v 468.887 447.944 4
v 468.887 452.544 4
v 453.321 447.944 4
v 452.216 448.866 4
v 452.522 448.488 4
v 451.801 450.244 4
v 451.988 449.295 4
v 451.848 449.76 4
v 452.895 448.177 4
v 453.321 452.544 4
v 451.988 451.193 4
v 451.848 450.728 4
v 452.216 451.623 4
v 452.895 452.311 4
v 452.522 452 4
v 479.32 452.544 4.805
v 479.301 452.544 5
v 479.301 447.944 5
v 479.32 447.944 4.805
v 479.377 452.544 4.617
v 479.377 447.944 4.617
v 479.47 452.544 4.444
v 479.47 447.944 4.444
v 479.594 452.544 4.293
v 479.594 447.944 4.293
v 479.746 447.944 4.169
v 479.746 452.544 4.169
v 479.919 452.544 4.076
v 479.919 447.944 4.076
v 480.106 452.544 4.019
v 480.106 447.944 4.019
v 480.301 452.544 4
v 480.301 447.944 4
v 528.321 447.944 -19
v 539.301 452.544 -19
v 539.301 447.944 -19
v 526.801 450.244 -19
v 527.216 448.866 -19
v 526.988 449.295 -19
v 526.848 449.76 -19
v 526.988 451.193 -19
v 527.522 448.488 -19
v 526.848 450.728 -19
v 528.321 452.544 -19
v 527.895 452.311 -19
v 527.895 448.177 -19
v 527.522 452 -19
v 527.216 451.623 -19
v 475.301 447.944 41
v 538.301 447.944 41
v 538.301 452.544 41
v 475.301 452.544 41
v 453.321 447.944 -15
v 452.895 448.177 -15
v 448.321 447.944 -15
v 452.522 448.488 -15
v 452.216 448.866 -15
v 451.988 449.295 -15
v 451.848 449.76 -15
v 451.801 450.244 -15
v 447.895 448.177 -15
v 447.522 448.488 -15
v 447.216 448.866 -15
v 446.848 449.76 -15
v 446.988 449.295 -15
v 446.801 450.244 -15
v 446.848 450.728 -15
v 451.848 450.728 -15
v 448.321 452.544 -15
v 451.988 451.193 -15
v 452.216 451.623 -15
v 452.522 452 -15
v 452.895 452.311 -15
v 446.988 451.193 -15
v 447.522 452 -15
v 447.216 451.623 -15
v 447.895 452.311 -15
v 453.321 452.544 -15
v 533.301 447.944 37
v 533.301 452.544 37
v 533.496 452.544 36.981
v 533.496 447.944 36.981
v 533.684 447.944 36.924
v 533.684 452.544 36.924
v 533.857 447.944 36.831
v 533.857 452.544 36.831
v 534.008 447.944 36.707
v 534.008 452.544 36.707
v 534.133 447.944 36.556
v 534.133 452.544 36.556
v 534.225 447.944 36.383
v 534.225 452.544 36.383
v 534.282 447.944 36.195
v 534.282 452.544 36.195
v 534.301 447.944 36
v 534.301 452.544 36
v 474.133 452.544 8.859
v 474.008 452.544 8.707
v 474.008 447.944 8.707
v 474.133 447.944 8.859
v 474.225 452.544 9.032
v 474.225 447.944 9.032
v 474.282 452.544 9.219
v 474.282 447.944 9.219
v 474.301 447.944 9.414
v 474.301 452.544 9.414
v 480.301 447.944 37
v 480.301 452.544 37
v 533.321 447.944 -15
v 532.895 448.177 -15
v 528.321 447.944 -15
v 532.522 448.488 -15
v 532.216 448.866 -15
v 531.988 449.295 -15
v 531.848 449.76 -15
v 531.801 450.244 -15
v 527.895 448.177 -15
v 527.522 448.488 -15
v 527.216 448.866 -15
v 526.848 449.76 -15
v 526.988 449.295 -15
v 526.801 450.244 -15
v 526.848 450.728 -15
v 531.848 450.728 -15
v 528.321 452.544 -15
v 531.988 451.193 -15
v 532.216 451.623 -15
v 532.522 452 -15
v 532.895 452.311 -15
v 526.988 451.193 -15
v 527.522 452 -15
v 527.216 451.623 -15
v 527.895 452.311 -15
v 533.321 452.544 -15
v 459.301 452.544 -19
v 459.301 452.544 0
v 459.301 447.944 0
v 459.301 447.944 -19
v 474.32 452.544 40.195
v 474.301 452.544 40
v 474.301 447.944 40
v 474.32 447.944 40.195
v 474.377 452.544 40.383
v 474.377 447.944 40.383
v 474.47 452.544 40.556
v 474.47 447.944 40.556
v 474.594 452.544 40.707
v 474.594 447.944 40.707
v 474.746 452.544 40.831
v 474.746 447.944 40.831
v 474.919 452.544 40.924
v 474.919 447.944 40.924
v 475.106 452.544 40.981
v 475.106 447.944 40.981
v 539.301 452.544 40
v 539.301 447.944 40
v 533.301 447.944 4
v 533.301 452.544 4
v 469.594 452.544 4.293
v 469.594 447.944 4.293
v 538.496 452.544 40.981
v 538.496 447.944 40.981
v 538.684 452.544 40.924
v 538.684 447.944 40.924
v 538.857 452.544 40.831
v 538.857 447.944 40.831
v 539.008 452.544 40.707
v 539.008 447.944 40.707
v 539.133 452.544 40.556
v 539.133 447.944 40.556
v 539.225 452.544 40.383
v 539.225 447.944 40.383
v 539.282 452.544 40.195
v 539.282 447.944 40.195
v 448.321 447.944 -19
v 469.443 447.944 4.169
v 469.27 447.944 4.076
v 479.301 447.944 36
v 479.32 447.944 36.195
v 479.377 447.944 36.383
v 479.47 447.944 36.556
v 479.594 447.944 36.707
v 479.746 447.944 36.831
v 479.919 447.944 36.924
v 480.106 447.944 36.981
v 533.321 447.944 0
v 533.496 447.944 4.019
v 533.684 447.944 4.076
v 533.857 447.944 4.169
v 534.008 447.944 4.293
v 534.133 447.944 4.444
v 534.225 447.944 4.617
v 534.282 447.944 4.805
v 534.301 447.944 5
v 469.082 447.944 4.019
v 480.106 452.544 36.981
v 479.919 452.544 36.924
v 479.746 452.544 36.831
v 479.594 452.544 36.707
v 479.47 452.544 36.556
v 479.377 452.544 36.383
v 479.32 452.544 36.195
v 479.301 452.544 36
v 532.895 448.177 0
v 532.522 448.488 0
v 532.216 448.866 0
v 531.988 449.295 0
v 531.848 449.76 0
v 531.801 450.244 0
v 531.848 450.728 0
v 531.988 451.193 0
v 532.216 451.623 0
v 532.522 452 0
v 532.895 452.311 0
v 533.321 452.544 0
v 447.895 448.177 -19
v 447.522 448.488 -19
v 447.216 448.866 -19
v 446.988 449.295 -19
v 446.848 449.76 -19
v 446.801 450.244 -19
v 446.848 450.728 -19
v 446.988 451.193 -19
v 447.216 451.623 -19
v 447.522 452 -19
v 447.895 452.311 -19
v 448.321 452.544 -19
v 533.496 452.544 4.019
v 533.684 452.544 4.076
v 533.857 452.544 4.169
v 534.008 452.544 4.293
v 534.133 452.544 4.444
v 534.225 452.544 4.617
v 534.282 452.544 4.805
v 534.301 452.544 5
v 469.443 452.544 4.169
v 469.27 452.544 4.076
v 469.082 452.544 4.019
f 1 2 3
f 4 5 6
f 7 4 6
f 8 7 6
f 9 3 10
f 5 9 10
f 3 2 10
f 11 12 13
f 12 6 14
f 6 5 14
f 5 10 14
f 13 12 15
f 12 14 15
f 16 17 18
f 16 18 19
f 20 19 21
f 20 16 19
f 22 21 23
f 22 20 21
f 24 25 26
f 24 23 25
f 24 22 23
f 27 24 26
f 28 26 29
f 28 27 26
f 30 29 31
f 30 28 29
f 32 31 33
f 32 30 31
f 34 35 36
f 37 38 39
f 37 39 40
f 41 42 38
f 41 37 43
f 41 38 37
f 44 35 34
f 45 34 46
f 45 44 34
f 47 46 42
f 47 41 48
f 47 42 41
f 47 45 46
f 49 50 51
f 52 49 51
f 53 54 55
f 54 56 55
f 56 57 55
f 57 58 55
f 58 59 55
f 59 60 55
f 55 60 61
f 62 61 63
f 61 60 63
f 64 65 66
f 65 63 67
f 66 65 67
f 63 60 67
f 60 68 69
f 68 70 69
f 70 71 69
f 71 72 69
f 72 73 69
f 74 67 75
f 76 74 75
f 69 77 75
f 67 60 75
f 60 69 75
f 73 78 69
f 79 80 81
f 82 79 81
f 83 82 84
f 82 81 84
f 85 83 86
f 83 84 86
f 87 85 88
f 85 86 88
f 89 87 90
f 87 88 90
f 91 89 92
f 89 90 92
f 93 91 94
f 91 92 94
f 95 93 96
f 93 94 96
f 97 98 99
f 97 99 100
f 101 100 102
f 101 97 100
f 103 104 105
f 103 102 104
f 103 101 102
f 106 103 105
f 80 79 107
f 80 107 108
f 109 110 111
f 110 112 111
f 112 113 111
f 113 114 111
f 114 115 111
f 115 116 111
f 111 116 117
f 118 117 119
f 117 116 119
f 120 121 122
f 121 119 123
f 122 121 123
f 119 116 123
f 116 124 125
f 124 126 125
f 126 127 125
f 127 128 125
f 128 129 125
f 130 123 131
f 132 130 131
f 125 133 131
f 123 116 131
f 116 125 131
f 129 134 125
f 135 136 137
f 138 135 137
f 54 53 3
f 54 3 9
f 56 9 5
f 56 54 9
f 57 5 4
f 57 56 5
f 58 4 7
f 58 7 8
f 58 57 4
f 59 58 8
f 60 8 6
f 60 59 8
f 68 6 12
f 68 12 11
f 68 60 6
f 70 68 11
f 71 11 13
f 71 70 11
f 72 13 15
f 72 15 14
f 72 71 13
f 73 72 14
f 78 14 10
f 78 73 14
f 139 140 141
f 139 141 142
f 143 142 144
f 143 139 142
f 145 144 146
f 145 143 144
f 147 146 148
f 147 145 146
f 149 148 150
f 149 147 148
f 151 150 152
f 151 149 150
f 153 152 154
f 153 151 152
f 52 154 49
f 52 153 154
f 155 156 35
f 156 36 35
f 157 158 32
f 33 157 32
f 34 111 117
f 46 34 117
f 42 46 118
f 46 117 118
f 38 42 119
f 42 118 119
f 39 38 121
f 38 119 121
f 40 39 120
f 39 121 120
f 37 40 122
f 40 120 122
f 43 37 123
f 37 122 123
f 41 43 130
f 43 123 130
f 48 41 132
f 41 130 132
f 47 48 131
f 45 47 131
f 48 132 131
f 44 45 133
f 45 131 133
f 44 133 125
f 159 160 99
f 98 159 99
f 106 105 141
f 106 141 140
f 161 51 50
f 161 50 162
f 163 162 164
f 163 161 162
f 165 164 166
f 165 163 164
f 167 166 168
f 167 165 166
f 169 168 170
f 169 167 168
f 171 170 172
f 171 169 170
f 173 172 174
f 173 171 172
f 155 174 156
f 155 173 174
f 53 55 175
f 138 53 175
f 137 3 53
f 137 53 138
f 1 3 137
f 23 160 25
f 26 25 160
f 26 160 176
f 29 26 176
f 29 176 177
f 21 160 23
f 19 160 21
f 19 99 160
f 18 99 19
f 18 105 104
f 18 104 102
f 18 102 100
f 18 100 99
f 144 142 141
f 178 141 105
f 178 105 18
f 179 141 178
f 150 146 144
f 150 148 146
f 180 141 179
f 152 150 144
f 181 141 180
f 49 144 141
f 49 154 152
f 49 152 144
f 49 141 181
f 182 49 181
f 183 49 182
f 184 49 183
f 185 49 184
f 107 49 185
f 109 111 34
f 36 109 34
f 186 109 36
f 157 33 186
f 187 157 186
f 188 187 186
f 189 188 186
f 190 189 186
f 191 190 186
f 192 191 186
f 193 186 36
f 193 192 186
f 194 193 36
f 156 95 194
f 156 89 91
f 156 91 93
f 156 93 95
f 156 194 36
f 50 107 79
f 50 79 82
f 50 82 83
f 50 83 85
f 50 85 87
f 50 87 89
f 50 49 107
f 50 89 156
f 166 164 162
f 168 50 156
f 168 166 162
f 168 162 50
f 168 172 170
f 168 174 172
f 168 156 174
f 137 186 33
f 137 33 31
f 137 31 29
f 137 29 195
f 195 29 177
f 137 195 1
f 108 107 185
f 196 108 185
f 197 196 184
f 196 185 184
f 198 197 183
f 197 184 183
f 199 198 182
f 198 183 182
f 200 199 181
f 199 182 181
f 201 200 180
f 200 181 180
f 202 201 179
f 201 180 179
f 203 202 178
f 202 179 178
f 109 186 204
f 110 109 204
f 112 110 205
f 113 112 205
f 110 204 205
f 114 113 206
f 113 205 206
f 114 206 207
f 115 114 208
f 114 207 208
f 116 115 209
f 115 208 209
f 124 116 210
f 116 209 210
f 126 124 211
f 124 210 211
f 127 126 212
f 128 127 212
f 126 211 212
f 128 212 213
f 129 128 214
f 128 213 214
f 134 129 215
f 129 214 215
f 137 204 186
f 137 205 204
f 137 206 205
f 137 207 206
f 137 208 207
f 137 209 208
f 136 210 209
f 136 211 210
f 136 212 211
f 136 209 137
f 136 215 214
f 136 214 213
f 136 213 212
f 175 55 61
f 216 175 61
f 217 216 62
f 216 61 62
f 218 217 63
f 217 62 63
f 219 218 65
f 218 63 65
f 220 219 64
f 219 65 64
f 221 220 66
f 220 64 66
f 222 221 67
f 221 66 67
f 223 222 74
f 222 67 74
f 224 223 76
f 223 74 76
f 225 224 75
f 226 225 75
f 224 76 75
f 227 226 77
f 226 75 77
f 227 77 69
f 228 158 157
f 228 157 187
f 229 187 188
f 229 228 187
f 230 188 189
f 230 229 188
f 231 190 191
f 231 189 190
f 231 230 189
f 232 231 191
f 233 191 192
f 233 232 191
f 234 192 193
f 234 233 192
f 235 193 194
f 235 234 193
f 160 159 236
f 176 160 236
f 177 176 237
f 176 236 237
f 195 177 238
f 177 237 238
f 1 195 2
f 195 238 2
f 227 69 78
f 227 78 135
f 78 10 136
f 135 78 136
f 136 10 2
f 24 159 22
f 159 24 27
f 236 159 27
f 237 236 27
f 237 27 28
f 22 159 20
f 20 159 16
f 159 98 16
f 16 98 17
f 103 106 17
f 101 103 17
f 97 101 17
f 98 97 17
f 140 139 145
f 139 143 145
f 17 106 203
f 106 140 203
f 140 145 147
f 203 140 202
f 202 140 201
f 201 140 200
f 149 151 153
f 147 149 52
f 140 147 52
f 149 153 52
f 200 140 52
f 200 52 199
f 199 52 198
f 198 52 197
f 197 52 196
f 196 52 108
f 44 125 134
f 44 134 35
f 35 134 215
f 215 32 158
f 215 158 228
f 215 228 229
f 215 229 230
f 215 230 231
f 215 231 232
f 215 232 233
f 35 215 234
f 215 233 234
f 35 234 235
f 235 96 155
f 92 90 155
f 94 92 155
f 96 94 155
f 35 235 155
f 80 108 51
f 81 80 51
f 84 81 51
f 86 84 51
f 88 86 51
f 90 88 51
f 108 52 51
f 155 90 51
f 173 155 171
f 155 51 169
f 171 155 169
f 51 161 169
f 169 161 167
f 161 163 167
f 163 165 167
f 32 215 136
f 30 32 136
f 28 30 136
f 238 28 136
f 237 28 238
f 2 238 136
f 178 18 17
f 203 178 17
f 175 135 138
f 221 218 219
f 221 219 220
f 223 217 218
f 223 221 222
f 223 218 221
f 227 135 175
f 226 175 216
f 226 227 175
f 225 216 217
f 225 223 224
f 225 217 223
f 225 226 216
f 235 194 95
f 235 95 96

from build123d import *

# Parameters (mm, degrees)
EXTRUDE_1_DEPTH     = 15
EXTRUDE_1_2_DEPTH   = 15
EXTRUDE_2_DEPTH     = 4
EXTRUDE_5_DEPTH     = 4
SKETCH_8_W          = 5
SKETCH_8_H          = 5
EXTRUDE_6_DEPTH     = 37
SKETCH_9_W          = 4
SKETCH_9_H          = 5
EXTRUDE_7_DEPTH     = 60
EXTRUDE_8_DEPTH     = 5
FILLET_1_R          = 1
FILLET_2_R          = 1
SKETCH_11_W         = 94.407997399
SKETCH_11_H         = 0.2
CUT_EXTRUDE_1_DEPTH = 61


with BuildPart() as part:
    # 草图1 → 凸台-拉伸1 (new body)
    with BuildSketch(Plane.XY):
        with BuildLine():
            Line((539.301234579, 452.744075086), (539.301234579, 447.744075086))
            Line((539.301234579, 447.744075086), (534.301234579, 447.744075086))
            ThreePointArc((534.301234579, 447.744075086), (531.801234579, 450.244075086), (534.301234579, 452.744075086))
            Line((534.301234579, 452.744075086), (539.301234579, 452.744075086))
        make_face()
    extrude(amount=-EXTRUDE_1_DEPTH)



with BuildPart() as body_2:
    # 草图1 → Extrude 1 2 (new body)
    with BuildSketch(Plane.XY):
        with BuildLine():
            Line((459.301234579, 452.744075086), (459.301234579, 447.744075086))
            Line((459.301234579, 447.744075086), (454.301234579, 447.744075086))
            ThreePointArc((454.301234579, 447.744075086), (451.801234579, 450.244075086), (454.301234579, 452.744075086))
            Line((454.301234579, 452.744075086), (459.301234579, 452.744075086))
        make_face()
    extrude(amount=-EXTRUDE_1_2_DEPTH)


with BuildPart() as part_1:
    add(part.part)

    add(body_2.part)  # 凸台-拉伸2 merges body 2
    # 草图2 → 凸台-拉伸2 (add)
    with BuildSketch(Plane(origin=(0, 0, -15), x_dir=(-1, 0, 0), z_dir=(0, 0, -1))):
        with BuildLine():
            Line((-529.301234579, 452.744075086), (-534.301234579, 452.744075086))
            Line((-534.301234579, 452.744075086), (-539.301234579, 452.744075086))
            Line((-539.301234579, 452.744075086), (-539.301234579, 447.744075086))
            Line((-539.301234579, 447.744075086), (-534.301234579, 447.744075086))
            Line((-534.301234579, 447.744075086), (-529.301234579, 447.744075086))
            ThreePointArc((-529.301234579, 447.744075086), (-526.801234579, 450.244075086), (-529.301234579, 452.744075086))
        make_face()
        with BuildLine():
            Line((-449.301234579, 452.744075086), (-459.301234579, 452.744075086))
            Line((-459.301234579, 452.744075086), (-459.301234579, 447.744075086))
            Line((-459.301234579, 447.744075086), (-449.301234579, 447.744075086))
            ThreePointArc((-449.301234579, 447.744075086), (-446.801234579, 450.244075086), (-449.301234579, 452.744075086))
        make_face()
    extrude(amount=EXTRUDE_2_DEPTH)

    # 草图7 → 凸台-拉伸5 (add)
    with BuildSketch(Plane.XY):
        with BuildLine():
            Line((539.301234579, 447.744075086), (454.301234579, 447.744075086))
            ThreePointArc((454.301234579, 447.744075086), (451.801234579, 450.244075086), (454.301234579, 452.744075086))
            Line((454.301234579, 452.744075086), (539.301234579, 452.744075086))
            Line((539.301234579, 452.744075086), (539.301234579, 447.744075086))
        make_face()
    extrude(amount=EXTRUDE_5_DEPTH)

    # 草图8 → 凸台-拉伸6 (add)
    with BuildSketch(Plane.XY.offset(4)):
        with Locations((536.801234579, 450.244075086)):
            Rectangle(SKETCH_8_W, SKETCH_8_H)
        with Locations((476.801234579, 450.244075086)):
            Rectangle(SKETCH_8_W, SKETCH_8_H)
    extrude(amount=EXTRUDE_6_DEPTH)

    # 草图9 → 凸台-拉伸7 (add)
    with BuildSketch(Plane.ZY.offset(-534.301234579)):
        with Locations((39, 450.244075086)):
            Rectangle(SKETCH_9_W, SKETCH_9_H)
    extrude(amount=EXTRUDE_7_DEPTH)

    # 草图10 → 凸台-拉伸8 (add)
    with BuildSketch(Plane.XZ.offset(-447.744075086)):
        Polygon((474.301234579, 4), (469.301234579, 4), (474.301234579, 9), align=None)
    extrude(amount=-EXTRUDE_8_DEPTH)

    # 圆角1
    fillet_1_edges = [part_1.edges().sort_by_distance(p)[0] for p in [
        (534.301234579, 450.244075086, 4),
        (479.301234579, 450.244075086, 4),
        (479.301234579, 450.244075086, 37),
        (534.301234579, 450.244075086, 37),
    ]]
    fillet(fillet_1_edges, radius=FILLET_1_R)

    # 圆角2
    fillet_2_edges = [part_1.edges().sort_by_distance(p)[0] for p in [
        (469.301234579, 450.244075086, 4),
        (474.301234579, 450.244075086, 9),
        (539.301234579, 450.244075086, 41),
        (474.301234579, 450.244075086, 41),
    ]]
    fillet(fillet_2_edges, radius=FILLET_2_R)

    # 草图11 → 切除-拉伸1 (cut, through all)
    with BuildSketch(Plane.XY.offset(41)):
        with Locations((493.383672974, 452.644075086)):
            Rectangle(SKETCH_11_W, SKETCH_11_H)
        with Locations((493.383672974, 447.844075086)):
            Rectangle(SKETCH_11_W, SKETCH_11_H)
    extrude(amount=-CUT_EXTRUDE_1_DEPTH, mode=Mode.SUBTRACT)


solid = part_1.part
